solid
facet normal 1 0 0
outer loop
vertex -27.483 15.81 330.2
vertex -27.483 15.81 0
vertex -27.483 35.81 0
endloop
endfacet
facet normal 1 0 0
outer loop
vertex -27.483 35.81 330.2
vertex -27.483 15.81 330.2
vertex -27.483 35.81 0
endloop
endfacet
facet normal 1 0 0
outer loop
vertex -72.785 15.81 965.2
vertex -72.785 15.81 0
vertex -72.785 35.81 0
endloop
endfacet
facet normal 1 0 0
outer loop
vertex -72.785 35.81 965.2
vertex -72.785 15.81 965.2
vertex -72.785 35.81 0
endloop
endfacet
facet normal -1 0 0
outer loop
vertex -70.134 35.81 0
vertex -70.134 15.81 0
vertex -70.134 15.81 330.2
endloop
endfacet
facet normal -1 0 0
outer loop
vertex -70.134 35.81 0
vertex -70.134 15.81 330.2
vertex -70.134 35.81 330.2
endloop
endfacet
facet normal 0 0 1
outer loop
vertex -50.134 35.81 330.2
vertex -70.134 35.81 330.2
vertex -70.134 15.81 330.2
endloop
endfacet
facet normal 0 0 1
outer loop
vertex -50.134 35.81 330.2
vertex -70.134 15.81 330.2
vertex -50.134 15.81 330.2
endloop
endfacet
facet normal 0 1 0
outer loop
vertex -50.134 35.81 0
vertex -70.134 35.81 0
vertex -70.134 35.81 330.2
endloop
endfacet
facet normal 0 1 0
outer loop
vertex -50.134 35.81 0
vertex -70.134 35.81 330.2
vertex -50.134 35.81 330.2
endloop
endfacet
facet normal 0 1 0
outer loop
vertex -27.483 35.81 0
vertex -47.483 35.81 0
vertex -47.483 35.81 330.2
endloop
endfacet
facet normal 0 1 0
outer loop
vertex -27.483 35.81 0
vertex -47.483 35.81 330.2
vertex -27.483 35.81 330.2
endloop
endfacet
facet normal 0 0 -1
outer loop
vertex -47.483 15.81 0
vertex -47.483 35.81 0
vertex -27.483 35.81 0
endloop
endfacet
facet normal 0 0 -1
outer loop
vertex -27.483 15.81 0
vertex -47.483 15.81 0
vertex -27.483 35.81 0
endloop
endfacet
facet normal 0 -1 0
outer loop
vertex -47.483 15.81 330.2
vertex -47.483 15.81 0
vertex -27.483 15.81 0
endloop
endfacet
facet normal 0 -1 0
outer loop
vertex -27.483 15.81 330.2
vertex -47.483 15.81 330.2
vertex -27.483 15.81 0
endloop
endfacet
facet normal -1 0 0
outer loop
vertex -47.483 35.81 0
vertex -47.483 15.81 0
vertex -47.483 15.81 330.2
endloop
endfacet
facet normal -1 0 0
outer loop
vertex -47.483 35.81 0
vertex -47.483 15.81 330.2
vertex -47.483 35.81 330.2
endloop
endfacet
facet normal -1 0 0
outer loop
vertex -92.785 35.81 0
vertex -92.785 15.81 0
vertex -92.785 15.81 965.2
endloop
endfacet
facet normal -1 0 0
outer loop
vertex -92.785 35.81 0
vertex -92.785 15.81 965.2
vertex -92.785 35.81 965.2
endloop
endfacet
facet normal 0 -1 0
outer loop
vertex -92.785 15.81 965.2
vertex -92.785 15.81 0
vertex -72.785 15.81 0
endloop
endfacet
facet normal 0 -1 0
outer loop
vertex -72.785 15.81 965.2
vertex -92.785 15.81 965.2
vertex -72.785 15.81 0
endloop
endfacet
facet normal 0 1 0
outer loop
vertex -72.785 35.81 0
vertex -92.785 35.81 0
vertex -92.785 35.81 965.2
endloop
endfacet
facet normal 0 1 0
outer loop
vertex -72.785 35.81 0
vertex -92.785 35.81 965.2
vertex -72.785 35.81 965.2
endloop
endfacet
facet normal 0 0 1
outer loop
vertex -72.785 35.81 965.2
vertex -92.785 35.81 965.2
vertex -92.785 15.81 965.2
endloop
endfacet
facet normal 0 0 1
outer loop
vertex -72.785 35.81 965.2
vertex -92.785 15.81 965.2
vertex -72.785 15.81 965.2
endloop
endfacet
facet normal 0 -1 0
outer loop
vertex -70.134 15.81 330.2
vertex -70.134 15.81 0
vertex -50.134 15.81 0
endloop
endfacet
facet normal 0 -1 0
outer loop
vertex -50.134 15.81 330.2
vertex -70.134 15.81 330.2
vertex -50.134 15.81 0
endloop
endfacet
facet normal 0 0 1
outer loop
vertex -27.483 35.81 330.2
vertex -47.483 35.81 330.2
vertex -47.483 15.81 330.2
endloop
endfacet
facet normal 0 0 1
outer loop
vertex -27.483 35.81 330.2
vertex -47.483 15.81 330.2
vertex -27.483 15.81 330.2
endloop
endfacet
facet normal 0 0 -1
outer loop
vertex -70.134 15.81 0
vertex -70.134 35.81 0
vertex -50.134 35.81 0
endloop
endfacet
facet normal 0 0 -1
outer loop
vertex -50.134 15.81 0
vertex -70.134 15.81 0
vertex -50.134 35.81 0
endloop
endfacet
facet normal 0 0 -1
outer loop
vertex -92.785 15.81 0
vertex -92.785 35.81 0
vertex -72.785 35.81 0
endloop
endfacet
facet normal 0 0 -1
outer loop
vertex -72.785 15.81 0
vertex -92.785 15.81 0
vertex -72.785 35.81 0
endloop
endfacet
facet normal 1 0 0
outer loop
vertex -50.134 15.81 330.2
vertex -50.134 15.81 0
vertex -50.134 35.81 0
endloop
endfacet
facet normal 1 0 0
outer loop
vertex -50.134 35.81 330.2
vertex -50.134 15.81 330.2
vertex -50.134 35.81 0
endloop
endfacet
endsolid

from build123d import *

# Parameters (mm, degrees)
F4_W     = 20
F4_H     = 20
F5_DEPTH = 965.2
F6_DEPTH = 330.2
F7_DEPTH = 330.2


with BuildPart() as f5:
    # F4 (on Top) → F5 (new body)
    with BuildSketch(Plane.XY):
        with Locations((-82.7848015636, 25.810001418)):
            Rectangle(F4_W, F4_H)
    extrude(amount=F5_DEPTH)


with BuildPart() as f6:
    # F4 (on Top) → F6 (new body)
    with BuildSketch(Plane.XY):
        with Locations((-60.1341330118, 25.810001418)):
            Rectangle(F4_W, F4_H)
    extrude(amount=F6_DEPTH)


with BuildPart() as f7:
    # F4 (on Top) → F7 (new body)
    with BuildSketch(Plane.XY):
        with Locations((-37.4834644599, 25.810001418)):
            Rectangle(F4_W, F4_H)
    extrude(amount=F7_DEPTH)


solid = Compound([f5.part, f6.part, f7.part])
